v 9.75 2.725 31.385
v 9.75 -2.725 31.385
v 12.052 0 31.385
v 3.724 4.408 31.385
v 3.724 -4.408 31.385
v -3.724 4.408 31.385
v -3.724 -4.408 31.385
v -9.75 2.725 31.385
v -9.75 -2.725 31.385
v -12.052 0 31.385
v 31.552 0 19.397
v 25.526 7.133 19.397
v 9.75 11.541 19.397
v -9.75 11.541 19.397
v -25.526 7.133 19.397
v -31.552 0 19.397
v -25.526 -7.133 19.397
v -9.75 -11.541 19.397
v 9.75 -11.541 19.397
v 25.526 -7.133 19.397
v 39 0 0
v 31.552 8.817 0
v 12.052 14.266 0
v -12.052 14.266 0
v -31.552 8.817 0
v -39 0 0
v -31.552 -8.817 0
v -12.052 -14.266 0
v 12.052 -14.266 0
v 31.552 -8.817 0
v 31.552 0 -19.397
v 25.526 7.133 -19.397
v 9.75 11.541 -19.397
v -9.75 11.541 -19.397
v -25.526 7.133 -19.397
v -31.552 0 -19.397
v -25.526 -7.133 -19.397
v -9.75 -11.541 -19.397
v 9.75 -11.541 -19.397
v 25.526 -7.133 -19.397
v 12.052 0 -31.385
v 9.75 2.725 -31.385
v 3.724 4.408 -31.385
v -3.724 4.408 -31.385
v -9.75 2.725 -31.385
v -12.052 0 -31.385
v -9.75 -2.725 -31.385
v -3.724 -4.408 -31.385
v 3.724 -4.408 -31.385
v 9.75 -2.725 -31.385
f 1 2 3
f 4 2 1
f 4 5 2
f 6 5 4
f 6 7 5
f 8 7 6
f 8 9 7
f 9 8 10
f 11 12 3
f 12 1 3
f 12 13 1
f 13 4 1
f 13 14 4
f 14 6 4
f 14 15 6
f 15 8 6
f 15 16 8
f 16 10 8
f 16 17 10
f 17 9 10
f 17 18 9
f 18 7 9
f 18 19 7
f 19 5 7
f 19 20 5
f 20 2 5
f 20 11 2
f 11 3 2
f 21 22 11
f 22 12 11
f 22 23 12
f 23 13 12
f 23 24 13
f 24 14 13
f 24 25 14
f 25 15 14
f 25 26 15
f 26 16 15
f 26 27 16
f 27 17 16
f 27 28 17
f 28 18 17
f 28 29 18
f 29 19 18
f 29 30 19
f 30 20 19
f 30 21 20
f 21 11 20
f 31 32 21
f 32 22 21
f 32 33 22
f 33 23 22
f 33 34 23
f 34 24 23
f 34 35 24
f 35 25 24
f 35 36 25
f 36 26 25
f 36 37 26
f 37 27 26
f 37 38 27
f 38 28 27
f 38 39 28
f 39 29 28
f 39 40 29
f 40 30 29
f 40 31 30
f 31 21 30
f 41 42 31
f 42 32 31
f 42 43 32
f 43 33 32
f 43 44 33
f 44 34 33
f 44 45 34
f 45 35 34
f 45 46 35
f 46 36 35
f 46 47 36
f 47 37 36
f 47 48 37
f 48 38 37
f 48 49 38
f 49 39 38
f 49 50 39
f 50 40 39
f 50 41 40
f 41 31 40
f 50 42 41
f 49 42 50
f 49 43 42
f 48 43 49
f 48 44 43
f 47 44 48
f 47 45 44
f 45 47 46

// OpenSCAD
// Generated by SolidPython 1.0.1 on 2020-07-29 00:46:50


scale(v = [13, 5, 11]) {
	sphere(r = 3);
}
/***********************************************
*********      SolidPython code:      **********
************************************************
 
# import packages: SolidPython
from solid import *
from solid.utils import *
from itertools import chain, combinations, permutations


class Resize:

    def __init__(self, scad_file):
        self.scad_file = scad_file
        #self.scad_file = import_scad(scad_file)
        # cone/cylinder param:
        self.r1 = 0
        self.r2 = 0
        self.h = 0
        # rectangular prism param:
        self.w = 0
        self.l = 0
        # ellipse param:
        self.r = 0

    # import OpenScad code (file name corresponds to shape)


    # classify shape + parameters
    def assign(self, param1, param2, param3):
        if self.scad_file == 'cone.scad':
            self.r1 = param1
            self.r2 = param2
            self.h = param3
        elif self.scad_file == 'cylinder.scad':
            self.r1 = param1
            self.r2 = param2
            self.h = param3
        elif self.scad_file == 'rectangularPrism.scad':
            self.h = param1
            self.l = param2
            self.w = param3
        else:
            self.r = param1
            self.h = param2

    # resize parameters
    def iterate(self):
        x = range(3, 20, 2)
        i = 1
        if self.scad_file == 'cone.scad':
            tempList = list(permutations(x, 2))
            for temp in tempList:
                param1 = temp[0]
                param2 = temp[1]
                filepath = 'produced_scad_files/' + 'cone' + str(param1) + '_' + str(param2) + '_' + '.scad'
                scad_render_to_file(cylinder(h=param1, r1=param2, r2=0), filepath)

        elif self.scad_file == 'cylinder.scad':
            tempList = list(permutations(x, 3))
            for temp in tempList:
                param1 = temp[0]
                param2 = temp[1]
                filepath = 'produced_scad_files/' + 'cylinder' + str(param1) + '_' + str(param2) + '_' + '.scad'
                scad_render_to_file(cylinder(h=param1, r1=param2, r2=param2), filepath)

        elif self.scad_file == 'rectangularPrism.scad':
            tempList = list(permutations(x, 3))
            for temp in tempList:
                param1 = temp[0]
                param2 = temp[1]
                param3 = temp[2]
                filepath = 'produced_scad_files/' + 'rectangularPrism' + str(param1) + '_' + str(param2) + '_' + str(
                    param3) + '.scad'
                scad_render_to_file(cube(size=(param1, param2, param3)), filepath)

        elif self.scad_file == 'ellipse.scad':
            tempList = list(permutations(x, 4))
            for temp in tempList:
                param1 = temp[0]
                param2 = temp[1]
                param3 = temp[2]
                param4 = temp[3]
                filepath = 'produced_scad_files/' + 'ellipse' + str(param1) + '_' + str(param2) + '_' + str(param3) + '_' + str(param4) + '.scad'
                scad_render_to_file(scale([param1, param2, param3])(sphere(r=param4)), filepath)

    def render_to_scadfile(self):
        scad_render_to_file(scad, 'example.scad') 
 
************************************************/
